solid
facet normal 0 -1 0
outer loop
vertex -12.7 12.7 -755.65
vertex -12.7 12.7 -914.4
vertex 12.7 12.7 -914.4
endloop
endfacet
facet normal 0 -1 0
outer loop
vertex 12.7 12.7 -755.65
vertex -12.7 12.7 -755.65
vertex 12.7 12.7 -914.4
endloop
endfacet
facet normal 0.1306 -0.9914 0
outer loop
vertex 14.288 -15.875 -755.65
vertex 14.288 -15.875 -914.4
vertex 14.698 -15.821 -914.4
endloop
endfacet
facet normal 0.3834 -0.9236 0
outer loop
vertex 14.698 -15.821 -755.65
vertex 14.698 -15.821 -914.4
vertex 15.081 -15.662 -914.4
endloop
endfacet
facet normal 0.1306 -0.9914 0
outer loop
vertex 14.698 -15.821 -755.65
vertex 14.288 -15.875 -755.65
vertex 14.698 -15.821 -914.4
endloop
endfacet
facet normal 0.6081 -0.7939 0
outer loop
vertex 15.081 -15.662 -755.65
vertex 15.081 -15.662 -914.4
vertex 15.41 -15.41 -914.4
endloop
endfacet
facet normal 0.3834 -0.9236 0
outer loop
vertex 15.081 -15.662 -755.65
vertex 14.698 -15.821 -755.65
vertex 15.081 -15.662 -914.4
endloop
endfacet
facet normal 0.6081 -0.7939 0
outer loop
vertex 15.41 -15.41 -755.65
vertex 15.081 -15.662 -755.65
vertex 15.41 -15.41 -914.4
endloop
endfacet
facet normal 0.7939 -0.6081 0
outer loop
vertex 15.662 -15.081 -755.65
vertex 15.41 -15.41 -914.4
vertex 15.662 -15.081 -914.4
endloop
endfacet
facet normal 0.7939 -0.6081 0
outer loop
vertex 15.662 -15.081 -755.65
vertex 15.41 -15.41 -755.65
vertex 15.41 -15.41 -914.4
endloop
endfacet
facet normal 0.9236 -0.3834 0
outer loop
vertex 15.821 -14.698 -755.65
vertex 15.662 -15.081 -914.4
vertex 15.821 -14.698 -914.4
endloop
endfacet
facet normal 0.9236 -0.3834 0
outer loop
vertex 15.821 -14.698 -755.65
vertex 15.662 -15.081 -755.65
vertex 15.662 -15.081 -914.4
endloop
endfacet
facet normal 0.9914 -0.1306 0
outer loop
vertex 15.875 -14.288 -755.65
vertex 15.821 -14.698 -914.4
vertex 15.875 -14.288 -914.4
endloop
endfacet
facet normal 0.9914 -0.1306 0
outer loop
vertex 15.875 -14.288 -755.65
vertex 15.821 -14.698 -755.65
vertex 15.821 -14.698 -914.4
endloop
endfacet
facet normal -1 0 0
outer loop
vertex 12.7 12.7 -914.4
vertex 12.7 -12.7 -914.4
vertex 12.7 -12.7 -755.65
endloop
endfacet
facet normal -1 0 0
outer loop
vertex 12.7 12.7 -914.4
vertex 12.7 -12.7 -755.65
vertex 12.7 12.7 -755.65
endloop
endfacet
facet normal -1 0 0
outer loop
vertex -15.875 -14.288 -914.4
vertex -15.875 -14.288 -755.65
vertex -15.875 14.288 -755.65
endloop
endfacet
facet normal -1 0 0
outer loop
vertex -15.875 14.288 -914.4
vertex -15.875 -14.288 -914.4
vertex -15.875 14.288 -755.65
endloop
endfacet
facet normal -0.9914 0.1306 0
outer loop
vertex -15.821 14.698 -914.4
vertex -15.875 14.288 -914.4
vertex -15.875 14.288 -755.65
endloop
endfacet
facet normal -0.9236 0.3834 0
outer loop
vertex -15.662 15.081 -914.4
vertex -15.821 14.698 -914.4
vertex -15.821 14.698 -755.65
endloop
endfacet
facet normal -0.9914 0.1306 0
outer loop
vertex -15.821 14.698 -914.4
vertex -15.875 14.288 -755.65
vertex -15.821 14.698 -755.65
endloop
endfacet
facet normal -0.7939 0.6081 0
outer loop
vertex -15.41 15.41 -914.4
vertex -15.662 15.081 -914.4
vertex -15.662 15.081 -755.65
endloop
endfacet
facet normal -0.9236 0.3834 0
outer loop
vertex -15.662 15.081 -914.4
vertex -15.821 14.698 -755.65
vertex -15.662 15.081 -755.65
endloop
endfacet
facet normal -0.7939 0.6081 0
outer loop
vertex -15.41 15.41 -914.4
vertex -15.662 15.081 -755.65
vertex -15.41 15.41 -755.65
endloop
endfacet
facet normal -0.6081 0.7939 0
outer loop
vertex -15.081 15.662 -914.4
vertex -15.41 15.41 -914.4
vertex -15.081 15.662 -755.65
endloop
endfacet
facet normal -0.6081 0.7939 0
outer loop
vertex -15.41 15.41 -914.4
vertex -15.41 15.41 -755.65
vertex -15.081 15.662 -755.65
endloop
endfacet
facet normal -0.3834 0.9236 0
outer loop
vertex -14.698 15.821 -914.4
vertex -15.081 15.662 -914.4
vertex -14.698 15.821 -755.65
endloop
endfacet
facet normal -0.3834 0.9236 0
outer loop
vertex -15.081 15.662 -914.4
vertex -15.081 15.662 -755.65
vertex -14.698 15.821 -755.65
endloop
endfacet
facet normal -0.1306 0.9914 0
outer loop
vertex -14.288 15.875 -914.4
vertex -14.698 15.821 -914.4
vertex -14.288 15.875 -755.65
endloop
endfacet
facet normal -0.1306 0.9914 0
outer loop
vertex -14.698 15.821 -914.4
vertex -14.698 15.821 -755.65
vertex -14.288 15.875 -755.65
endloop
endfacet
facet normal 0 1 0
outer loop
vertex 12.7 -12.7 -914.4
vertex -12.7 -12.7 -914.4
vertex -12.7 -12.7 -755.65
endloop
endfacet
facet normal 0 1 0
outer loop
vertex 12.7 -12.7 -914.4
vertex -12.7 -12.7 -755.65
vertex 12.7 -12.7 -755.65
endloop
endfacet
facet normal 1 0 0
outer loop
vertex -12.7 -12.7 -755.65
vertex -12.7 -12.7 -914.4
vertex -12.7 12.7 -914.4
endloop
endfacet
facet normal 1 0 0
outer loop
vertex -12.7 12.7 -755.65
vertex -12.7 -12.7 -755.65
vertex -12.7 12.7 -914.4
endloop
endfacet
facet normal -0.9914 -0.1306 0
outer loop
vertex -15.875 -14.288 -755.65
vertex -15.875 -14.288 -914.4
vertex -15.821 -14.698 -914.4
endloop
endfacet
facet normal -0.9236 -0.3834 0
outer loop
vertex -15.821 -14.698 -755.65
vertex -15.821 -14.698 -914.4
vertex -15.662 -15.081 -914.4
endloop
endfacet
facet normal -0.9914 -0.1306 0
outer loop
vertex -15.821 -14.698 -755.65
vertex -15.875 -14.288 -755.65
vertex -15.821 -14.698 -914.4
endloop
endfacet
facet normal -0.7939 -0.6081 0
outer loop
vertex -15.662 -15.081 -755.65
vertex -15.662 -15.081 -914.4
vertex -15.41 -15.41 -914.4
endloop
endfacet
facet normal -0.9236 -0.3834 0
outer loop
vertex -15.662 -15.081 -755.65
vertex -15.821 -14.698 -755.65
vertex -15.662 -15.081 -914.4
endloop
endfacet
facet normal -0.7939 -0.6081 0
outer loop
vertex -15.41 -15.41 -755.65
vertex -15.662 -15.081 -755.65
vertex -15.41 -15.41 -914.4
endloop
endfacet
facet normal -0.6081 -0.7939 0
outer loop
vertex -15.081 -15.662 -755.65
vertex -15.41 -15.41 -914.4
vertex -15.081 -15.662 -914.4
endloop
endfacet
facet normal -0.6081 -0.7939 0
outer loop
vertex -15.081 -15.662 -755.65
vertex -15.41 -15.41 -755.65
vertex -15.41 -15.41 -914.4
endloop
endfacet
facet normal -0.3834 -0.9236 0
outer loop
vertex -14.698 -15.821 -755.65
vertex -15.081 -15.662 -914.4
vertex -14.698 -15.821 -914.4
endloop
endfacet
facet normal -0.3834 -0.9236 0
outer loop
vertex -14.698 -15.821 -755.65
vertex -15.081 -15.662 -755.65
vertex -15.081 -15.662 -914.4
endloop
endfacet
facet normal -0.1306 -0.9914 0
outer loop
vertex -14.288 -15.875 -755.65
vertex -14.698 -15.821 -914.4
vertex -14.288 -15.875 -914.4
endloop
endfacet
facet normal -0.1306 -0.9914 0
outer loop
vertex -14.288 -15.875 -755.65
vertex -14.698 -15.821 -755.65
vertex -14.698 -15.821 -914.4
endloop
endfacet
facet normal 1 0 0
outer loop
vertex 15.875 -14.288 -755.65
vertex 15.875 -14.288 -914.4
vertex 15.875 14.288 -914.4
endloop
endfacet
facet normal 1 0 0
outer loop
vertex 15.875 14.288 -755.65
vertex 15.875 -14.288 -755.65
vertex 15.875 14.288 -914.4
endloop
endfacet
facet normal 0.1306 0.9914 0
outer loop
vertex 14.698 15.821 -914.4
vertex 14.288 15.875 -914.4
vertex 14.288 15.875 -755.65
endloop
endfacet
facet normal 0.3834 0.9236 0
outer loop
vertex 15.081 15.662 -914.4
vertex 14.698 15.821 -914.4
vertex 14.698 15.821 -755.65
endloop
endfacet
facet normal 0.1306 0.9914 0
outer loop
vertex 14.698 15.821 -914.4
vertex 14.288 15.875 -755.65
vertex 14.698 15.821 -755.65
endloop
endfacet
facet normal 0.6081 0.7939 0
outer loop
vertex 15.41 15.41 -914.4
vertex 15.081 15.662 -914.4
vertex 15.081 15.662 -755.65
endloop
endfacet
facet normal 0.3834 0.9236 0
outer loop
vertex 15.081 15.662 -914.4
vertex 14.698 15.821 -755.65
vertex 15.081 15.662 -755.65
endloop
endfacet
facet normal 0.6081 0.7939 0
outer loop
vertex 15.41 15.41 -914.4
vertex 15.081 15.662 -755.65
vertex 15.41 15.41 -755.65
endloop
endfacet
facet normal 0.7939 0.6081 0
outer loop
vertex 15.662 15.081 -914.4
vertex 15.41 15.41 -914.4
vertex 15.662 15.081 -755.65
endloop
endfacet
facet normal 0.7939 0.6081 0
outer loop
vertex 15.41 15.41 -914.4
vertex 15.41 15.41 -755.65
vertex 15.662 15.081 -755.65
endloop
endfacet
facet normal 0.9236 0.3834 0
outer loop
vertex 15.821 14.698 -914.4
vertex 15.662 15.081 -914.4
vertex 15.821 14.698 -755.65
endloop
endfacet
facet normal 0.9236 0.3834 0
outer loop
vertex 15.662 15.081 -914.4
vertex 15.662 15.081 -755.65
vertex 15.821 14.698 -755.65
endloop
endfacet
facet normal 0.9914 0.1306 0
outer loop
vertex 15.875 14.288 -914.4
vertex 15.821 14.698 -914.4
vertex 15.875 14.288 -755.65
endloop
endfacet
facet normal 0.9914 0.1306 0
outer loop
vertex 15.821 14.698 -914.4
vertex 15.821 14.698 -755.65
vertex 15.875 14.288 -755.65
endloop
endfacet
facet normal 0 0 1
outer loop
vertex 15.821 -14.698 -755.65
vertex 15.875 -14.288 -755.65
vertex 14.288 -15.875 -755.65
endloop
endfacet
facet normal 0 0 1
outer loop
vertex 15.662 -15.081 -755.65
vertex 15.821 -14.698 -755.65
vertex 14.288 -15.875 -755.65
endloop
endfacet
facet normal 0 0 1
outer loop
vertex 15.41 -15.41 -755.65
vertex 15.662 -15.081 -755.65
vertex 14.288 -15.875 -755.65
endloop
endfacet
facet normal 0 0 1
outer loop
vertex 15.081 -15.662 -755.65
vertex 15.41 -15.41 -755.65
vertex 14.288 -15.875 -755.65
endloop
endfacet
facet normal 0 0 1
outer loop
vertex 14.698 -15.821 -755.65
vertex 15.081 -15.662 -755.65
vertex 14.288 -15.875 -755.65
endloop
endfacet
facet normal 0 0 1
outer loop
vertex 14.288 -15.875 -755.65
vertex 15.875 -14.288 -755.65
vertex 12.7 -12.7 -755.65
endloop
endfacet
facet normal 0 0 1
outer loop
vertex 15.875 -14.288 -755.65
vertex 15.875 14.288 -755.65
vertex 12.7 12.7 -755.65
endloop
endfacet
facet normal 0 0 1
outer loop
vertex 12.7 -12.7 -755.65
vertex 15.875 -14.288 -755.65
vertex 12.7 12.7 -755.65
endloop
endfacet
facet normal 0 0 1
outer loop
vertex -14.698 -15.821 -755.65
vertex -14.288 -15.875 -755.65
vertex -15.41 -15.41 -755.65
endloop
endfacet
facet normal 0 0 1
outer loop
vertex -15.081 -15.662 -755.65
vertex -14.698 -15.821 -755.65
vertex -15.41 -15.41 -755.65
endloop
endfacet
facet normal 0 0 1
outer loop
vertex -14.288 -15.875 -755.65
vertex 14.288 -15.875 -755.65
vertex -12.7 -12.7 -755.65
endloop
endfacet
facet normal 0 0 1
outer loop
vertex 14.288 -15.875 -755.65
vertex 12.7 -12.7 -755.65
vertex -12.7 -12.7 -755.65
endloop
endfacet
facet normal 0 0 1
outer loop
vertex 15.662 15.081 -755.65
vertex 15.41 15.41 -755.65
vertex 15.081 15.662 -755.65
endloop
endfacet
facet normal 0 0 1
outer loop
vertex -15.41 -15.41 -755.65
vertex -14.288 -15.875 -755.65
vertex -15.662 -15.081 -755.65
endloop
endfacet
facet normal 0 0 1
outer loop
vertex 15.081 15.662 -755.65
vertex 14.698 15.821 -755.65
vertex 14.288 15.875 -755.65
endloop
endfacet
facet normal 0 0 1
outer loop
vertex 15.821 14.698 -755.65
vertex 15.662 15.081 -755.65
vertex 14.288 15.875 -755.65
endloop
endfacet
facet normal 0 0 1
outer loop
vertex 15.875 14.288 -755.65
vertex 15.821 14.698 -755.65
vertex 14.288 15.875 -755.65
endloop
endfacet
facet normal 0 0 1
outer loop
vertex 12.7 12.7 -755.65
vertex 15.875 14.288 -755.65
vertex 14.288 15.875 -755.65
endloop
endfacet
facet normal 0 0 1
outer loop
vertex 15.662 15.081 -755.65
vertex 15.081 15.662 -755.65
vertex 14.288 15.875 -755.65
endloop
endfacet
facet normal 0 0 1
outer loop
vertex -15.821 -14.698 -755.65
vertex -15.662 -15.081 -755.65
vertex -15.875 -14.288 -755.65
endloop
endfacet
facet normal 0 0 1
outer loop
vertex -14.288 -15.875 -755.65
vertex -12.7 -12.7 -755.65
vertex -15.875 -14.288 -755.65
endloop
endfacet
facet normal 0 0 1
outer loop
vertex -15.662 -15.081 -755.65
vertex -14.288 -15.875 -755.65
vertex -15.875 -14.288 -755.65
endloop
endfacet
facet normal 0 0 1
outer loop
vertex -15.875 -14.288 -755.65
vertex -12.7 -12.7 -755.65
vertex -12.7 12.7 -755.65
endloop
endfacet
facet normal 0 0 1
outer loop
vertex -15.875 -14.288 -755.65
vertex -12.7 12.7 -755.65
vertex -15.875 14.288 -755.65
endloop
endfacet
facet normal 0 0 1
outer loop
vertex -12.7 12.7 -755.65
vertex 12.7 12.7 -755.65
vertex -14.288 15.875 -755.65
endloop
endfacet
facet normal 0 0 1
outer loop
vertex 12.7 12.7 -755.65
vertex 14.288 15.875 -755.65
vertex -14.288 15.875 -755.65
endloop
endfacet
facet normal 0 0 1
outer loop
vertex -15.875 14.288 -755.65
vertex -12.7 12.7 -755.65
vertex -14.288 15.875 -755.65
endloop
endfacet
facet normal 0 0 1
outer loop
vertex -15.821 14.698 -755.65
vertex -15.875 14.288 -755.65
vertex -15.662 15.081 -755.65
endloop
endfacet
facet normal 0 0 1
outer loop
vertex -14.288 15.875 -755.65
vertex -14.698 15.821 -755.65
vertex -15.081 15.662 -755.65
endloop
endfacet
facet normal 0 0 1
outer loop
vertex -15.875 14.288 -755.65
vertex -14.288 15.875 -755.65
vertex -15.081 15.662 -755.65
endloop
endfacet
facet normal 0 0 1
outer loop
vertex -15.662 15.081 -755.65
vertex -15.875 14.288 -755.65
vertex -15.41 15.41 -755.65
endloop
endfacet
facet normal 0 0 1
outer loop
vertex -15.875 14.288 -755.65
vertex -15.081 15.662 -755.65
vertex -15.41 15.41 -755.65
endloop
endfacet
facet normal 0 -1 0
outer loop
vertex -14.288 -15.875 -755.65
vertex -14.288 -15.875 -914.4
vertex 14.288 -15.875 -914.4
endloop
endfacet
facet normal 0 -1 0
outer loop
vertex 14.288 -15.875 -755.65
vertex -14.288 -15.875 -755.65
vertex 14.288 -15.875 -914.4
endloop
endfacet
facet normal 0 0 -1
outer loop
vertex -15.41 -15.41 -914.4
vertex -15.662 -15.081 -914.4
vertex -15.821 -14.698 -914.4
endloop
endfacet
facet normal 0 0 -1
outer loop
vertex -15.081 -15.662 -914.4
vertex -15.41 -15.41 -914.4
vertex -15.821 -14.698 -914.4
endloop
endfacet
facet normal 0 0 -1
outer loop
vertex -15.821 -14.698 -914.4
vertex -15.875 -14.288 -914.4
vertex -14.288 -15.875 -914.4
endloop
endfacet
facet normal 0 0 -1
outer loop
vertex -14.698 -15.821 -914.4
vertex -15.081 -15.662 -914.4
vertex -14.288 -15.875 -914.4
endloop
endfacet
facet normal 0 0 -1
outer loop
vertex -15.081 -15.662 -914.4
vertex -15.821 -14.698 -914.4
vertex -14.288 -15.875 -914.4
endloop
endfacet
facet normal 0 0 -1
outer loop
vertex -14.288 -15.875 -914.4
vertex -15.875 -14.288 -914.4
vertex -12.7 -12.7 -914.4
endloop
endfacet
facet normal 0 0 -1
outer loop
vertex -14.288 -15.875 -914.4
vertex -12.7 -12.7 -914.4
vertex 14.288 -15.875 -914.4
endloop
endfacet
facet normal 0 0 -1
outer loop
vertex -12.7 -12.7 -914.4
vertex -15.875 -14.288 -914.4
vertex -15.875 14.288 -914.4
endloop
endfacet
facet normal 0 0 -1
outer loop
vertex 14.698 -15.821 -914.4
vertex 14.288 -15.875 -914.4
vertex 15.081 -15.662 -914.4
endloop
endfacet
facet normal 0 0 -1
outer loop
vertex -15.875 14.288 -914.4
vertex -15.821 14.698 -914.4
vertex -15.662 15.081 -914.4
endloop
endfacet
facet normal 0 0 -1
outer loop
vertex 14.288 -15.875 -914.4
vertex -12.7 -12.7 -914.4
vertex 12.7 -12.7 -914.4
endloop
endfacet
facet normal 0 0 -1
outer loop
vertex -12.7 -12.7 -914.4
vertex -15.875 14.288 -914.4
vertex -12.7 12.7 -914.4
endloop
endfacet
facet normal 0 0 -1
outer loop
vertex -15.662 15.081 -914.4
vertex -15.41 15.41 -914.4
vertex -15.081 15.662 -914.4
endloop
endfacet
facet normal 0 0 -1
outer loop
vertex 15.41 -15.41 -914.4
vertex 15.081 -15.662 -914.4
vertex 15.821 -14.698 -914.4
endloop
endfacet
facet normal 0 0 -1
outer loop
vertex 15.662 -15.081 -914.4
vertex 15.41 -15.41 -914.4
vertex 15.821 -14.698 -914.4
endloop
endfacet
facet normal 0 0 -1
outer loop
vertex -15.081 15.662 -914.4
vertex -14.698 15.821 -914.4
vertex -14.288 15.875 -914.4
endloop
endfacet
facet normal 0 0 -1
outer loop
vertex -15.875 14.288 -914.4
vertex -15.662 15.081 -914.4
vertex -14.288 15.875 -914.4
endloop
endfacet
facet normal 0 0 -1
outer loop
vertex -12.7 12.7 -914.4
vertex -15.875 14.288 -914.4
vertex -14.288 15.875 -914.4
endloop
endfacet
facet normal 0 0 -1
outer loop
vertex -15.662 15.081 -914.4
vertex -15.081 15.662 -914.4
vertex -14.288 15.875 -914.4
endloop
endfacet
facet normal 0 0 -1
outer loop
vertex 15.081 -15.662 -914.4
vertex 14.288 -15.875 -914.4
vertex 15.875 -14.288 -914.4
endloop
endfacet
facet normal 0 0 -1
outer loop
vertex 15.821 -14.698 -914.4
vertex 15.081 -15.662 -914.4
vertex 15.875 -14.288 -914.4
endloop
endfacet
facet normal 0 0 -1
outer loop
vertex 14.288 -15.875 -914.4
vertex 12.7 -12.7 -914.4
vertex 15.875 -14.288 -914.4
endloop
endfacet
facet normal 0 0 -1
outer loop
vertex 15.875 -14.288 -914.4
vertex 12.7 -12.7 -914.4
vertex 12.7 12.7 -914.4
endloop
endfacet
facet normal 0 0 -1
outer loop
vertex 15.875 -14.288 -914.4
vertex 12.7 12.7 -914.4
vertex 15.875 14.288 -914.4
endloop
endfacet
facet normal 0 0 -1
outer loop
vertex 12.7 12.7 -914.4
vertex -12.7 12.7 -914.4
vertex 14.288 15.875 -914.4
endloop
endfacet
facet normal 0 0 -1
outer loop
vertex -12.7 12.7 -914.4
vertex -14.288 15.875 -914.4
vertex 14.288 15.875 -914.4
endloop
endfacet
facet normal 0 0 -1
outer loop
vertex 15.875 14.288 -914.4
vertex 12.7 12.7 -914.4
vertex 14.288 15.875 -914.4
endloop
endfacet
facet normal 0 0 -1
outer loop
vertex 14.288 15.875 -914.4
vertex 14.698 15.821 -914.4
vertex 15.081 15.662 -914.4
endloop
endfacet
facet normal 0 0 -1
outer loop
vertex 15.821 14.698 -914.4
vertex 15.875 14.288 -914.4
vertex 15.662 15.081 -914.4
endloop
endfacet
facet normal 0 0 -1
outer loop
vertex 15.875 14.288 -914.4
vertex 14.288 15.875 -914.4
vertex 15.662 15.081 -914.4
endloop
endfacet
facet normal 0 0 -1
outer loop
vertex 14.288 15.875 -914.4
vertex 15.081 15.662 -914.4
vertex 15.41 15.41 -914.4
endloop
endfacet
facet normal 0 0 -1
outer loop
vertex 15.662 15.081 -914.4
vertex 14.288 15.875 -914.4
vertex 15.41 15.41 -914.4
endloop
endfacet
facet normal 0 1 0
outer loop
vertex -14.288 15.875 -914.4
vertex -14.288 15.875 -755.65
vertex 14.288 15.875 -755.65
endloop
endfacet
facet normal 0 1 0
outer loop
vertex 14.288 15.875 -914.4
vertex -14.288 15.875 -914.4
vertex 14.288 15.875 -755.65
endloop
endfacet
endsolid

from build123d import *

# Parameters (mm, degrees)
BOSS_EXTRUDE1_DEPTH      = 914.4
BOSS_EXTRUDE1_DEPTH_BACK = 914.4
SKETCH1_W                = 31.75
SKETCH1_H                = 31.75
SKETCH1_W_2              = 25.4
SKETCH1_H_2              = 25.4
FILLET1_R                = 1.5875
SKETCH5_W                = 25.4
SKETCH5_H                = 25.4
CUT_EXTRUDE1_DEPTH       = 1670.05


with BuildPart() as part:
    # Sketch1 → Boss-Extrude1 (new, two sides: drawn at the far end of the back side and taken through both)
    with BuildSketch(Plane.XY.offset(-BOSS_EXTRUDE1_DEPTH_BACK)):
        Rectangle(SKETCH1_W, SKETCH1_H)
        Rectangle(SKETCH1_W_2, SKETCH1_H_2, mode=Mode.SUBTRACT)
    extrude(amount=BOSS_EXTRUDE1_DEPTH + BOSS_EXTRUDE1_DEPTH_BACK)

    # Fillet1
    fillet1_edges = [part.edges().sort_by_distance(p)[0] for p in [
        (15.875, -15.875, 0),
        (-15.875, -15.875, 0),
        (-15.875, 15.875, 0),
        (15.875, 15.875, 0),
    ]]
    fillet(fillet1_edges, radius=FILLET1_R)

    # Sketch5 → Cut-Extrude1 (cut)
    with BuildSketch(Plane.XY.offset(914.4)):
        with BuildLine():
            Line((-14.2875, 15.875), (14.2875, 15.875))
            ThreePointArc((14.2875, 15.875), (15.410032015, 15.410032015), (15.875, 14.2875))
            Line((15.875, 14.2875), (15.875, -14.2875))
            ThreePointArc((15.875, -14.2875), (15.410032015, -15.410032015), (14.2875, -15.875))
            Line((14.2875, -15.875), (-14.2875, -15.875))
            ThreePointArc((-14.2875, -15.875), (-15.410032015, -15.410032015), (-15.875, -14.2875))
            Line((-15.875, -14.2875), (-15.875, 14.2875))
            ThreePointArc((-15.875, 14.2875), (-15.410032015, 15.410032015), (-14.2875, 15.875))
        make_face()
        Rectangle(SKETCH5_W, SKETCH5_H, mode=Mode.SUBTRACT)
    extrude(amount=-CUT_EXTRUDE1_DEPTH, mode=Mode.SUBTRACT)


solid = part.part
